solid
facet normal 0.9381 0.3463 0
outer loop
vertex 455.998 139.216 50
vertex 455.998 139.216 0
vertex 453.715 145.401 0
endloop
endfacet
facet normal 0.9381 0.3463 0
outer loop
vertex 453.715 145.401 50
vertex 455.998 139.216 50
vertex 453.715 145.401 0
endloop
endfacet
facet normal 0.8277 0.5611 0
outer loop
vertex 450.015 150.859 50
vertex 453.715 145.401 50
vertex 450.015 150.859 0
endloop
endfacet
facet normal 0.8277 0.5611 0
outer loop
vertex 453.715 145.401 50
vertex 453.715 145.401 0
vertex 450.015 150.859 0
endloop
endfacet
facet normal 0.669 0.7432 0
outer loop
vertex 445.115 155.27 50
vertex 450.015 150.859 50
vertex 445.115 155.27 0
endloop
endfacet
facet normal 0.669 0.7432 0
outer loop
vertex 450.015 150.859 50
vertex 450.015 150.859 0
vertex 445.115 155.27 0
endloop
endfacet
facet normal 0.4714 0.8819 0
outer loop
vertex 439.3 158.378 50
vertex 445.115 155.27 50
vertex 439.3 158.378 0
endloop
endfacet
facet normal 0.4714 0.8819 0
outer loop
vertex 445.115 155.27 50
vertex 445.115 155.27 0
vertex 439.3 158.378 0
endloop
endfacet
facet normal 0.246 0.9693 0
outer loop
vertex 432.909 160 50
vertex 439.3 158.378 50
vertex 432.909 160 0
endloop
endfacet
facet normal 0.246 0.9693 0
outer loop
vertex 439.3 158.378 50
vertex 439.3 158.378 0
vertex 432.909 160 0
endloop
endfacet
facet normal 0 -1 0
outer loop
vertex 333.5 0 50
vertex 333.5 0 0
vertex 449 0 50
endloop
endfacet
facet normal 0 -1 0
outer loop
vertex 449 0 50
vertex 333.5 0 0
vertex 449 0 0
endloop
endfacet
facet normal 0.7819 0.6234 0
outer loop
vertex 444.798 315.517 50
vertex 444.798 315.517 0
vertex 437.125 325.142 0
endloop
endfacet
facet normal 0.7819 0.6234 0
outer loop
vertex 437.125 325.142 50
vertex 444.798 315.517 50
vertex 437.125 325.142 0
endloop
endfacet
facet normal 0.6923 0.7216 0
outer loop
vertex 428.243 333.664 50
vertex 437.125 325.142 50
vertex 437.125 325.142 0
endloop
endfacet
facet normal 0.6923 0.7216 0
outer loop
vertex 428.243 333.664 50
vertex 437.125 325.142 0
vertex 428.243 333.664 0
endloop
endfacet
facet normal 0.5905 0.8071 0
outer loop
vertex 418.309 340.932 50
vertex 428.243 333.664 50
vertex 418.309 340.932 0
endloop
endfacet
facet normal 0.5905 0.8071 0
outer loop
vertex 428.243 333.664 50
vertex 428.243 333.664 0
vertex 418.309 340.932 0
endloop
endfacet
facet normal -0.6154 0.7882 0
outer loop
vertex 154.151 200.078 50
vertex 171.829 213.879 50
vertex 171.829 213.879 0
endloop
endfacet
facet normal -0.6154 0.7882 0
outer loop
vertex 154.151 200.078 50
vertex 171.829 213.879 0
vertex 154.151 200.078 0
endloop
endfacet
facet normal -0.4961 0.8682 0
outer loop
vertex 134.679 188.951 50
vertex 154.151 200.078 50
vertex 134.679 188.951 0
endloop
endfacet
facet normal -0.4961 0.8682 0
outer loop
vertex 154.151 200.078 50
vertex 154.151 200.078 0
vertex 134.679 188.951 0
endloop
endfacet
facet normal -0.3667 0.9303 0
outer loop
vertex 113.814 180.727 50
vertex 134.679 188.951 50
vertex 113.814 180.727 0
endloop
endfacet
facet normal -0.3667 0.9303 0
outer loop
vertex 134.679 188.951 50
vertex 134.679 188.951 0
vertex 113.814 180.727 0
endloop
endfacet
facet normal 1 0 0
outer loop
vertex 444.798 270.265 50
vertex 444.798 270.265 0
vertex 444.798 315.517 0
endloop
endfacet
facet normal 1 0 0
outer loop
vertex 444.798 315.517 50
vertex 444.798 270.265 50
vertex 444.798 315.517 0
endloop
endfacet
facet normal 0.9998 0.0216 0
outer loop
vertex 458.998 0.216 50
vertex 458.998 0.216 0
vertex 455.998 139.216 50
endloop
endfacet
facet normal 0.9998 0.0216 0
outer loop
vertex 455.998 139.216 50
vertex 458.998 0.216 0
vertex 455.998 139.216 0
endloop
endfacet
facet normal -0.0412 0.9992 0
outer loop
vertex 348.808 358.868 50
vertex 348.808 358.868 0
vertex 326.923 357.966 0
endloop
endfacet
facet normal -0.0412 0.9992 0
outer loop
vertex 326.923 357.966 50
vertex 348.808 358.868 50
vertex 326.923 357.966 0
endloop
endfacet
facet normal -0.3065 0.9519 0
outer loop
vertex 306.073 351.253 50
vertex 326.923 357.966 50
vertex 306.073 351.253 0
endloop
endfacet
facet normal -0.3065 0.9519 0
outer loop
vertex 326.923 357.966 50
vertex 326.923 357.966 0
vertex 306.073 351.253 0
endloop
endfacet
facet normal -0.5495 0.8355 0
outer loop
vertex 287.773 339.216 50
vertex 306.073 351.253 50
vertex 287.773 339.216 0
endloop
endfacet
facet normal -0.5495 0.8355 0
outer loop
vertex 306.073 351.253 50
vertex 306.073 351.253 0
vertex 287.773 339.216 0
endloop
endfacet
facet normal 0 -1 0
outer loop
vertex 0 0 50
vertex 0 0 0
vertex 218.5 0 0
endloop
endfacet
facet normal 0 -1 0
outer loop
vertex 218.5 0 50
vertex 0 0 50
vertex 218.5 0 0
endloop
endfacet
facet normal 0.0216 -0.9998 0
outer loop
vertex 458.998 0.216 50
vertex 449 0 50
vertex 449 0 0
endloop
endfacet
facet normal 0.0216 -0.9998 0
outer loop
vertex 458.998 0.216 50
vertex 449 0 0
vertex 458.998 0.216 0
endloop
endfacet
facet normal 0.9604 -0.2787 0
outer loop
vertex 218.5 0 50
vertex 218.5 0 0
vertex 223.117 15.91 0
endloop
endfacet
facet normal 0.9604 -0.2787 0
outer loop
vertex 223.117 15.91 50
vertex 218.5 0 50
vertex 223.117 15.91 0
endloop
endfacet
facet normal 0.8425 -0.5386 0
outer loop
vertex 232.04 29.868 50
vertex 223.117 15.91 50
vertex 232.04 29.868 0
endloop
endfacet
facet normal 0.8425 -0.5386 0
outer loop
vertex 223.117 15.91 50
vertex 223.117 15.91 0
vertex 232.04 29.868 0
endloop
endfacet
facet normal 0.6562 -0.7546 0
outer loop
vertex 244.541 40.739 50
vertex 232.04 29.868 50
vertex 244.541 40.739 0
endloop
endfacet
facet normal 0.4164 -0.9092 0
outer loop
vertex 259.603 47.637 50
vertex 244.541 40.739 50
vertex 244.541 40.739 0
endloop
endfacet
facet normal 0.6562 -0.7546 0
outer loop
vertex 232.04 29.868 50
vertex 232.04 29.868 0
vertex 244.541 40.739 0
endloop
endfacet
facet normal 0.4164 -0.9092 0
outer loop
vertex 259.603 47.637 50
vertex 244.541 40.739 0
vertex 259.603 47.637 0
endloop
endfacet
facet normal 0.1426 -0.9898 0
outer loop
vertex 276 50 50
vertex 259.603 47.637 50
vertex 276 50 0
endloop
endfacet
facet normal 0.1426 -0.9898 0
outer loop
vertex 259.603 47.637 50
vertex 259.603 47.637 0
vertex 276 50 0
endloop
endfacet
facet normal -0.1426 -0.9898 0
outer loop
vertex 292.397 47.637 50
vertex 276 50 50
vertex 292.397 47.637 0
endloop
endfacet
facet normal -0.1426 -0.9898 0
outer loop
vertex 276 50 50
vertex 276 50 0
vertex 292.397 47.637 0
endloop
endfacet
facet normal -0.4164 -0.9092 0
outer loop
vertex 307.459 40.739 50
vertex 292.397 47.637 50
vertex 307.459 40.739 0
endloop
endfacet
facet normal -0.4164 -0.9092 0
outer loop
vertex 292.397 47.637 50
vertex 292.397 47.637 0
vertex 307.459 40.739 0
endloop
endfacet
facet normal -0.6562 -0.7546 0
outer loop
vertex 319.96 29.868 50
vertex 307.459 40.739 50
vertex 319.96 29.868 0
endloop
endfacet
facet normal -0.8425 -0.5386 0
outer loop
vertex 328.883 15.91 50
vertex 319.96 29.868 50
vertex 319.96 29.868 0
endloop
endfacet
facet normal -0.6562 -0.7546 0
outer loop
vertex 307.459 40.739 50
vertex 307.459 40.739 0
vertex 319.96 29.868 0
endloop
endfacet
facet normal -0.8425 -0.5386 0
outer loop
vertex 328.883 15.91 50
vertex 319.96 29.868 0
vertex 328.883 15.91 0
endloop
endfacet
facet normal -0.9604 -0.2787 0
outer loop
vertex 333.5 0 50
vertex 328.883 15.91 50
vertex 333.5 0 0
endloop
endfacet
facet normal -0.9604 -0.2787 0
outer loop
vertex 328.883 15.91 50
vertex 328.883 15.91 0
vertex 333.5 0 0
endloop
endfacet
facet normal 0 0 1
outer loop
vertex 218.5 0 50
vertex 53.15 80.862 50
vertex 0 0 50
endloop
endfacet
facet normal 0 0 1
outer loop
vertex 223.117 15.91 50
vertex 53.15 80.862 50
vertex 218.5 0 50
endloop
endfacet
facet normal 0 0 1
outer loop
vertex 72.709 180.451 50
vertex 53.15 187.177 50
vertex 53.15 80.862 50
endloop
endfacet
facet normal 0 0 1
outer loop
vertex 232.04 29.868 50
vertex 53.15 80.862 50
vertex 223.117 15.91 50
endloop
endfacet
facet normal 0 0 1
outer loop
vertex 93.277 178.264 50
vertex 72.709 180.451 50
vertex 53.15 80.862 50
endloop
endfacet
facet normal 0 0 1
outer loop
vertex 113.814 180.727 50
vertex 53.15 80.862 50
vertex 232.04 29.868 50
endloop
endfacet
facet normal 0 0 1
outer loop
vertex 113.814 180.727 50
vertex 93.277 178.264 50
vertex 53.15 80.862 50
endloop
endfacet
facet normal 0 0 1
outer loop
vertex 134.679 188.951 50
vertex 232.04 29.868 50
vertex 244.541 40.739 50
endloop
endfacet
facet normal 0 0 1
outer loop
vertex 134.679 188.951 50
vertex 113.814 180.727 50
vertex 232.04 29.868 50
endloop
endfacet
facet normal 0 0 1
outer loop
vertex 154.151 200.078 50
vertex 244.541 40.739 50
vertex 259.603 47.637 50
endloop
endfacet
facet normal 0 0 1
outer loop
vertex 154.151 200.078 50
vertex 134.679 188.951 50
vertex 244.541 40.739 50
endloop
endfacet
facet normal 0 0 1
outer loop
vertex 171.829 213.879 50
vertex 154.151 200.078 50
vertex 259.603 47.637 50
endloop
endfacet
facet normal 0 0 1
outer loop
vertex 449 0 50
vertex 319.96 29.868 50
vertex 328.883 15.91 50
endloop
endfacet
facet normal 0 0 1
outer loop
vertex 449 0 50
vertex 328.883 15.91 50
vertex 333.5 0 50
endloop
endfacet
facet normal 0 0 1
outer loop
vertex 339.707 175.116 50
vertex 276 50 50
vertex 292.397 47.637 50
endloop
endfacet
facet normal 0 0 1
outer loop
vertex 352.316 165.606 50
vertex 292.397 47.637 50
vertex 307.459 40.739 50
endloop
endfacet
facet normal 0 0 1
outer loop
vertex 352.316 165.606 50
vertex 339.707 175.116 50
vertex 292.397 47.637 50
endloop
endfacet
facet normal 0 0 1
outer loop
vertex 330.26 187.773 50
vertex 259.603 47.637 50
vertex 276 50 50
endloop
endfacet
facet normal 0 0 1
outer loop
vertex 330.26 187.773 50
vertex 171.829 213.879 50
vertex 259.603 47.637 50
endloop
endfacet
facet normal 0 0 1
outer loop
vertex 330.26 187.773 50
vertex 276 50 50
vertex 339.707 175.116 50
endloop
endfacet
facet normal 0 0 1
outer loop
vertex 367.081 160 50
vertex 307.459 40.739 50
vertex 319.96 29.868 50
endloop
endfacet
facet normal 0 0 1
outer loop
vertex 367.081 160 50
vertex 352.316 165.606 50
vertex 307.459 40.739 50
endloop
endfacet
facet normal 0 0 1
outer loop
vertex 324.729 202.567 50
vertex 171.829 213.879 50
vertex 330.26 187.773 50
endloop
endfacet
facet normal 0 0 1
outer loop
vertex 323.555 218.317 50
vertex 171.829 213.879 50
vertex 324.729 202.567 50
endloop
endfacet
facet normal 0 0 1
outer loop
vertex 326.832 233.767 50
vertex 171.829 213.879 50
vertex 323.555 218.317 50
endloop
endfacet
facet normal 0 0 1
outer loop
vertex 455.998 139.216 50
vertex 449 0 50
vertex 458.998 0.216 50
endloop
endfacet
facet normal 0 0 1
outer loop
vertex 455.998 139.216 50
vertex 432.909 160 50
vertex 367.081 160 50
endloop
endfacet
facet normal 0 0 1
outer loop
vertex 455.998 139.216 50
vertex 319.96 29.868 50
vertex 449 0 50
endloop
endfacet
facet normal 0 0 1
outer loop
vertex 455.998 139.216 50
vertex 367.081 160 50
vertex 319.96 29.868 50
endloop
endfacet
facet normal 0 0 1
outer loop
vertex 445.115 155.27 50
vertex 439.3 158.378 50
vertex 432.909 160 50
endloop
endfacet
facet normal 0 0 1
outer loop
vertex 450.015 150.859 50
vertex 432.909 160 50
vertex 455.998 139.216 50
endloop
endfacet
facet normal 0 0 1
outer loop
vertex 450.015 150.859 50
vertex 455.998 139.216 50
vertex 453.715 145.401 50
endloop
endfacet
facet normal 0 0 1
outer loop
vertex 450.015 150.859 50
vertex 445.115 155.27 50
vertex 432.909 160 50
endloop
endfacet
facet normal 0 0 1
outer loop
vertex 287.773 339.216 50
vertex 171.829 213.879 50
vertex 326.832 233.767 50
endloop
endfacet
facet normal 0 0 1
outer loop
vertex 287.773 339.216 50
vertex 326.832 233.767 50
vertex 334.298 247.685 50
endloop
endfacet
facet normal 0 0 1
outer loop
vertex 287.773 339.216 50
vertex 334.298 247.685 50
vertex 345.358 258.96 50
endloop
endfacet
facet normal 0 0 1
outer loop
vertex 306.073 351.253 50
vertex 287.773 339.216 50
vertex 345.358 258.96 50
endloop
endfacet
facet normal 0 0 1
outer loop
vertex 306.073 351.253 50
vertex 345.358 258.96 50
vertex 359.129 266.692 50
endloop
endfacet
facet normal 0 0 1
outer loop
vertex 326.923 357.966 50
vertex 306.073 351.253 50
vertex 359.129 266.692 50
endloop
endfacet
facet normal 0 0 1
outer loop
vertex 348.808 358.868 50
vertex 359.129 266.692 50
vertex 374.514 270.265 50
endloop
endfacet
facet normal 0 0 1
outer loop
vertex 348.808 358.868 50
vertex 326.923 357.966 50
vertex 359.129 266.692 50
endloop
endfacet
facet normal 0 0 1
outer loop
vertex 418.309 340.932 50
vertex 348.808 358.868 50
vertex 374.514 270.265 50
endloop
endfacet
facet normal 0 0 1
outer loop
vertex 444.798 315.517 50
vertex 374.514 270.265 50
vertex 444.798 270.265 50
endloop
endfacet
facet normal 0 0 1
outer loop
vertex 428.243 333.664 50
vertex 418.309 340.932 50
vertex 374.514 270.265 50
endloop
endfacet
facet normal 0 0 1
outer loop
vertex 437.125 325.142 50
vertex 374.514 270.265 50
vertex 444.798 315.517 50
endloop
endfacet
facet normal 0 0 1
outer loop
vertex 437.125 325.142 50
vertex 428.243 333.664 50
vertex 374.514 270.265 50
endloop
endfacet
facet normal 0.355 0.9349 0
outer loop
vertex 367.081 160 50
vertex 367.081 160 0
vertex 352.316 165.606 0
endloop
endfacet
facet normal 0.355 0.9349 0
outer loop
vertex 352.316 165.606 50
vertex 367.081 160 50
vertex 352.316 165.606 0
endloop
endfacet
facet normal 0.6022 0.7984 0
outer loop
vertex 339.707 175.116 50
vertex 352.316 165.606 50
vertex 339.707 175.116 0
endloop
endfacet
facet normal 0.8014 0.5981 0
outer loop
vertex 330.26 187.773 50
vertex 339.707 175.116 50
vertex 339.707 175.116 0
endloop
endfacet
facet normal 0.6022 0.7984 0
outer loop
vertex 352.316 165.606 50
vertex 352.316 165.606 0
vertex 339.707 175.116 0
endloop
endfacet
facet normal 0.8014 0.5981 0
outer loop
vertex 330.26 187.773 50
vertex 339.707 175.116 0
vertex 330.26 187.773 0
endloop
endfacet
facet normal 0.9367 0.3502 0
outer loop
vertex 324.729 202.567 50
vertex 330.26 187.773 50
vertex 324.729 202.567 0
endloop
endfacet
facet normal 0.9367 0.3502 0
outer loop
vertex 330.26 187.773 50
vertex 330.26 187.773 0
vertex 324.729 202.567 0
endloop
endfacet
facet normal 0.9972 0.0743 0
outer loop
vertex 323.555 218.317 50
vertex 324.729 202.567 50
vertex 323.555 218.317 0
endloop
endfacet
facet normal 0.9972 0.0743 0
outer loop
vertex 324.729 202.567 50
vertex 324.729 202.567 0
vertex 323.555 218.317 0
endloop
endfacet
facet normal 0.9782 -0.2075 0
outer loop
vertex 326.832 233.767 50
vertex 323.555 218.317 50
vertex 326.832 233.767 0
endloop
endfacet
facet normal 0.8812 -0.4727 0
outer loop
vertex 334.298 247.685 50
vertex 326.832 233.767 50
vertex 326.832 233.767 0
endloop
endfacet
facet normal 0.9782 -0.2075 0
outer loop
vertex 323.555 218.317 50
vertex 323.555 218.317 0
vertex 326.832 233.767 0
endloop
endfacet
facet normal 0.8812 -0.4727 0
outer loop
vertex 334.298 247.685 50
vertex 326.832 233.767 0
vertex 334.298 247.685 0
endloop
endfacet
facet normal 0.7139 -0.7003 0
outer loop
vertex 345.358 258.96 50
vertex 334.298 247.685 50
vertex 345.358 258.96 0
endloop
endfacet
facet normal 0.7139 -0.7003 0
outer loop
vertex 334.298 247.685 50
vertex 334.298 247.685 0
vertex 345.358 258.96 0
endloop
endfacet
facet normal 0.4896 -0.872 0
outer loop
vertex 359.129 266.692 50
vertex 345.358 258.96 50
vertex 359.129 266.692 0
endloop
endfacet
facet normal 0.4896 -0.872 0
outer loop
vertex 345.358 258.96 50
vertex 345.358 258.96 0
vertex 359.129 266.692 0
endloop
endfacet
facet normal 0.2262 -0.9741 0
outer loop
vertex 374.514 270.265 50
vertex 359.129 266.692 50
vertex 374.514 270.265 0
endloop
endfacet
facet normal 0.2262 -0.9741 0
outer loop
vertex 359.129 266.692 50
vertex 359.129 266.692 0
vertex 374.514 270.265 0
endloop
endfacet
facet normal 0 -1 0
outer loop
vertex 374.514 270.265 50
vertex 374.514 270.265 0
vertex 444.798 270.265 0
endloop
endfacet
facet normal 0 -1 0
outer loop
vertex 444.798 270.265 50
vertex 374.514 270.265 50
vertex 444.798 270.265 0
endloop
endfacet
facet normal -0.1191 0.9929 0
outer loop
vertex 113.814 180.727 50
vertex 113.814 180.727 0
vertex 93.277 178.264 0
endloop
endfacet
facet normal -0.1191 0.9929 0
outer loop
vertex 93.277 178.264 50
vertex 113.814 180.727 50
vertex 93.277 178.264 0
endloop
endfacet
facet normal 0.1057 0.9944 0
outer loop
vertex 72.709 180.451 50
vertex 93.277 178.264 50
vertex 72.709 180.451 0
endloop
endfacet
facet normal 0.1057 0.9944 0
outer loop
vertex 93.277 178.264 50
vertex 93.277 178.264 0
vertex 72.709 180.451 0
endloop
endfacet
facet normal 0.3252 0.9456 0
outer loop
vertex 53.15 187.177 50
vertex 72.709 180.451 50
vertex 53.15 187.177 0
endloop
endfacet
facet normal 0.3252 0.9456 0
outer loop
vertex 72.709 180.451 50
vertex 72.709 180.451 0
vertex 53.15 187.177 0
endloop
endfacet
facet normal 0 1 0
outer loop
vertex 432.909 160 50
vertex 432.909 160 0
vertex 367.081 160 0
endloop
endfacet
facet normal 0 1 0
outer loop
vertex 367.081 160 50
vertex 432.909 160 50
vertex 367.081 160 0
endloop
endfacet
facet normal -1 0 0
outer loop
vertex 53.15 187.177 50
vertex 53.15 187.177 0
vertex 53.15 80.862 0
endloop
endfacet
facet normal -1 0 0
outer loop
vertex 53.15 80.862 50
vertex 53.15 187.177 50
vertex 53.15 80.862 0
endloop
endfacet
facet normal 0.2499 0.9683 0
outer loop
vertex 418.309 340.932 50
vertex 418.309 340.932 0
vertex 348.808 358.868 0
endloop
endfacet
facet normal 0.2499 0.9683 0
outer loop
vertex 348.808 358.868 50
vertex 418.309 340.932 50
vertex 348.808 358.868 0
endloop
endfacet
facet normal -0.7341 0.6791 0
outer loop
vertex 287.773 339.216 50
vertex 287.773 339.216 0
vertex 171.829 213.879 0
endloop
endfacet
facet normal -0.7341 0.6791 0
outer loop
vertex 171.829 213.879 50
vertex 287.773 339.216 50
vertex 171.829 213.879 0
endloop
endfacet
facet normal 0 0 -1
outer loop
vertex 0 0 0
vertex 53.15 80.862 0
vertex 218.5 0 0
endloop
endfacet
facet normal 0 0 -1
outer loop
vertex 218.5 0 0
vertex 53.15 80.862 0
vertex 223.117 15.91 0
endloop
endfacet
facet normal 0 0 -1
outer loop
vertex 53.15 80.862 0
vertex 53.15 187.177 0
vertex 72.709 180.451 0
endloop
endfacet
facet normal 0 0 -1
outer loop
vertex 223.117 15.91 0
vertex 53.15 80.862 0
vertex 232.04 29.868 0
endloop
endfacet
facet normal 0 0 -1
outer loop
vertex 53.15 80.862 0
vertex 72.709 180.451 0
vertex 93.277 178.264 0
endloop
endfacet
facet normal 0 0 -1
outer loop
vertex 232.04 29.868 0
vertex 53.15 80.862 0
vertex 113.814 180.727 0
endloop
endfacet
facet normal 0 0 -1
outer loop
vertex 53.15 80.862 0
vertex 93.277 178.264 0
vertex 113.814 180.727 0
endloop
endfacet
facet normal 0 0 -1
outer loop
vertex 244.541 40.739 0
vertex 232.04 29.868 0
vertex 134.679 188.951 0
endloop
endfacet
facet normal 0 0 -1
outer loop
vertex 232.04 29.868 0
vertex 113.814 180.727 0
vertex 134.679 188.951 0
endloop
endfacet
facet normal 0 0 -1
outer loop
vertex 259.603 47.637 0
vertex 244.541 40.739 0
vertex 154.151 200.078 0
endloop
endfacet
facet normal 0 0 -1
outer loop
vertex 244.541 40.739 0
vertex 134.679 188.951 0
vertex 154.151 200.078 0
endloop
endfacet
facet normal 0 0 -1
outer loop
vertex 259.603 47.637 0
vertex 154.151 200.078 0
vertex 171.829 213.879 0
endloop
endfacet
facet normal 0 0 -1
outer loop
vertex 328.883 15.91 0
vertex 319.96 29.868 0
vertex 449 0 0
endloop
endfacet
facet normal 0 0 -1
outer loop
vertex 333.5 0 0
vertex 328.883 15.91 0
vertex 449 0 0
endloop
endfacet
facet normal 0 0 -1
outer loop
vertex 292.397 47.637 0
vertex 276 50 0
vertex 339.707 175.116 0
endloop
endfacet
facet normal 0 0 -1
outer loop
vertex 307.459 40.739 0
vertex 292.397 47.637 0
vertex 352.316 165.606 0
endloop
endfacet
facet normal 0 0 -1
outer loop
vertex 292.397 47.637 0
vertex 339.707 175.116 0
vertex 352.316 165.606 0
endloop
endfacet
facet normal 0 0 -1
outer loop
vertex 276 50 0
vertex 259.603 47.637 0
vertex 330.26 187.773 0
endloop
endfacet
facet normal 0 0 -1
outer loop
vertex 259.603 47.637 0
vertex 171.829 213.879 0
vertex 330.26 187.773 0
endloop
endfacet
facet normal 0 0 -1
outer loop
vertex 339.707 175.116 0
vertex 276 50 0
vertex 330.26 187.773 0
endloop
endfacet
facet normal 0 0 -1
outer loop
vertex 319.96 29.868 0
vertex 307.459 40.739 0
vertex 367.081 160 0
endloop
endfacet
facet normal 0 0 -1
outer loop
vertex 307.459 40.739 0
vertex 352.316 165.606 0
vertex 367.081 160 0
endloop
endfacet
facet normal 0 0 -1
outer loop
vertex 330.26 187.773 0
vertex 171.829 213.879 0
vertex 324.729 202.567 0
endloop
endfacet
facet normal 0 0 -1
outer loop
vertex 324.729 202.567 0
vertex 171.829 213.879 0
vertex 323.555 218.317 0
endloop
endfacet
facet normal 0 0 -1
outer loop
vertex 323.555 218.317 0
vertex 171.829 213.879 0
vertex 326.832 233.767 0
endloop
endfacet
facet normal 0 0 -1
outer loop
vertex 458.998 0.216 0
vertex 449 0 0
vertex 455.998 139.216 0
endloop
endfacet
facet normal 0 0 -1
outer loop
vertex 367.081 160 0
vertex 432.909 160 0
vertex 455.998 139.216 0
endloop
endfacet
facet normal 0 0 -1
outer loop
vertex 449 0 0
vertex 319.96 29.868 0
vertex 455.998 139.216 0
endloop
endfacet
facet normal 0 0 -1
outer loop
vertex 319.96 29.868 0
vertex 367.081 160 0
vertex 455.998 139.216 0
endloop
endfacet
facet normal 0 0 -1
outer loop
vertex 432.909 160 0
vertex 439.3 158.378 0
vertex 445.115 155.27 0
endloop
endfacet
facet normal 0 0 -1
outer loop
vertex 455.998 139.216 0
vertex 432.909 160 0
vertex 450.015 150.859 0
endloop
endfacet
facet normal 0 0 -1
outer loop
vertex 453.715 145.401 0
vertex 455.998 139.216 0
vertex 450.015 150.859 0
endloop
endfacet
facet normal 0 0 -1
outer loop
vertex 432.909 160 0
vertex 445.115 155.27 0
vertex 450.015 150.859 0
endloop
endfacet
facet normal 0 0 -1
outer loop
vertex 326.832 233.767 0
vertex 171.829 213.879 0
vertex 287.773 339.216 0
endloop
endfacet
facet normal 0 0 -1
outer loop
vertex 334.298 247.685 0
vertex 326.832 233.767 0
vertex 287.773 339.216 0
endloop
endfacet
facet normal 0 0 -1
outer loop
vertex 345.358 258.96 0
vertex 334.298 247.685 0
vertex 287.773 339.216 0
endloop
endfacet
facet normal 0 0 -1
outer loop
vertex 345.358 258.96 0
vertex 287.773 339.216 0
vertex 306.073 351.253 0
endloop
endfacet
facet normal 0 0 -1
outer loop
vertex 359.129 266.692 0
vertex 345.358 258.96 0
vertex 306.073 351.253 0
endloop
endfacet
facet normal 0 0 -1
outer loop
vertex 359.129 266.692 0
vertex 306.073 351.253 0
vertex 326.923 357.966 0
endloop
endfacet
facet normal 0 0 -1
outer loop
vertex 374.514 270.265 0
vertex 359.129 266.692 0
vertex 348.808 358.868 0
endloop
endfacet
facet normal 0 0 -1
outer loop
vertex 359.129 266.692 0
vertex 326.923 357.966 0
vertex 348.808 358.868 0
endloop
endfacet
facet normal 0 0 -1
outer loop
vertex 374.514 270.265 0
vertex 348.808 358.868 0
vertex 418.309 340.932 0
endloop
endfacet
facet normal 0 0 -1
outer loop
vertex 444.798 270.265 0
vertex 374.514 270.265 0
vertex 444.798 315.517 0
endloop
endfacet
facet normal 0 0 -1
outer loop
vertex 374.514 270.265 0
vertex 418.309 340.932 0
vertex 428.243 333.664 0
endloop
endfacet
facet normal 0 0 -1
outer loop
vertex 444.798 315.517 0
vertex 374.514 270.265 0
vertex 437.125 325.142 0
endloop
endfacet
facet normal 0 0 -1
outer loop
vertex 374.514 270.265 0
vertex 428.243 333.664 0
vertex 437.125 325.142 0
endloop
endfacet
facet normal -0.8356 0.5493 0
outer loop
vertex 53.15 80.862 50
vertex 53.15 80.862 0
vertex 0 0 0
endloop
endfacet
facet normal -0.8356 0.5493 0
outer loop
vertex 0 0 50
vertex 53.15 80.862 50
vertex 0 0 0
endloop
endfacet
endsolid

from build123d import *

# Parameters (mm, degrees)
TABAN_FLAN_1_DEPTH = 50


# Sheet-metal steps are written as plain solids
with BuildPart() as part:
    # Çizim1 → Taban-Flanş1 (new body)
    with BuildSketch(Plane.XY):
        with BuildLine():
            Line((0, 0), (218.5, 0))
            ThreePointArc((218.5, 0), (276, 50), (333.5, 0))
            Line((333.5, 0), (360, 0))
            Line((360, 0), (449, 0))
            Line((449, 0), (458.997671741, 0.215777088))
            Line((458.997671741, 0.215777088), (455.997671741, 139.215777088))
            ThreePointArc((455.997671741, 139.215777088), (447.698955646, 153.213358252), (432.909011054, 160))
            Line((432.909011054, 160), (367.081412811, 160))
            ThreePointArc((367.081412811, 160), (323.554697394, 218.317011668), (374.513743955, 270.265297284))
            Line((374.513743955, 270.265297284), (434.798113421, 270.265297284))
            Line((434.798113421, 270.265297284), (444.798113421, 270.265297284))
            Line((444.798113421, 270.265297284), (444.798113421, 315.516988045))
            ThreePointArc((444.798113421, 315.516988045), (432.826102146, 329.550683033), (418.309236409, 340.931994828))
            Line((418.309236409, 340.931994828), (348.808103312, 358.867771111))
            ThreePointArc((348.808103312, 358.867771111), (316.270646866, 355.31487857), (287.772711056, 339.215910531))
            Line((287.772711056, 339.215910531), (171.828858079, 213.879290682))
            ThreePointArc((171.828858079, 213.879290682), (144.61514494, 194.164293468), (113.814091907, 180.726941422))
            ThreePointArc((113.814091907, 180.726941422), (82.931673061, 178.777598724), (53.149679292, 187.177395023))
            Line((53.149679292, 187.177395023), (53.149679292, 80.862415296))
            Line((53.149679292, 80.862415296), (0, 0))
        make_face()
    extrude(amount=TABAN_FLAN_1_DEPTH)


solid = part.part
